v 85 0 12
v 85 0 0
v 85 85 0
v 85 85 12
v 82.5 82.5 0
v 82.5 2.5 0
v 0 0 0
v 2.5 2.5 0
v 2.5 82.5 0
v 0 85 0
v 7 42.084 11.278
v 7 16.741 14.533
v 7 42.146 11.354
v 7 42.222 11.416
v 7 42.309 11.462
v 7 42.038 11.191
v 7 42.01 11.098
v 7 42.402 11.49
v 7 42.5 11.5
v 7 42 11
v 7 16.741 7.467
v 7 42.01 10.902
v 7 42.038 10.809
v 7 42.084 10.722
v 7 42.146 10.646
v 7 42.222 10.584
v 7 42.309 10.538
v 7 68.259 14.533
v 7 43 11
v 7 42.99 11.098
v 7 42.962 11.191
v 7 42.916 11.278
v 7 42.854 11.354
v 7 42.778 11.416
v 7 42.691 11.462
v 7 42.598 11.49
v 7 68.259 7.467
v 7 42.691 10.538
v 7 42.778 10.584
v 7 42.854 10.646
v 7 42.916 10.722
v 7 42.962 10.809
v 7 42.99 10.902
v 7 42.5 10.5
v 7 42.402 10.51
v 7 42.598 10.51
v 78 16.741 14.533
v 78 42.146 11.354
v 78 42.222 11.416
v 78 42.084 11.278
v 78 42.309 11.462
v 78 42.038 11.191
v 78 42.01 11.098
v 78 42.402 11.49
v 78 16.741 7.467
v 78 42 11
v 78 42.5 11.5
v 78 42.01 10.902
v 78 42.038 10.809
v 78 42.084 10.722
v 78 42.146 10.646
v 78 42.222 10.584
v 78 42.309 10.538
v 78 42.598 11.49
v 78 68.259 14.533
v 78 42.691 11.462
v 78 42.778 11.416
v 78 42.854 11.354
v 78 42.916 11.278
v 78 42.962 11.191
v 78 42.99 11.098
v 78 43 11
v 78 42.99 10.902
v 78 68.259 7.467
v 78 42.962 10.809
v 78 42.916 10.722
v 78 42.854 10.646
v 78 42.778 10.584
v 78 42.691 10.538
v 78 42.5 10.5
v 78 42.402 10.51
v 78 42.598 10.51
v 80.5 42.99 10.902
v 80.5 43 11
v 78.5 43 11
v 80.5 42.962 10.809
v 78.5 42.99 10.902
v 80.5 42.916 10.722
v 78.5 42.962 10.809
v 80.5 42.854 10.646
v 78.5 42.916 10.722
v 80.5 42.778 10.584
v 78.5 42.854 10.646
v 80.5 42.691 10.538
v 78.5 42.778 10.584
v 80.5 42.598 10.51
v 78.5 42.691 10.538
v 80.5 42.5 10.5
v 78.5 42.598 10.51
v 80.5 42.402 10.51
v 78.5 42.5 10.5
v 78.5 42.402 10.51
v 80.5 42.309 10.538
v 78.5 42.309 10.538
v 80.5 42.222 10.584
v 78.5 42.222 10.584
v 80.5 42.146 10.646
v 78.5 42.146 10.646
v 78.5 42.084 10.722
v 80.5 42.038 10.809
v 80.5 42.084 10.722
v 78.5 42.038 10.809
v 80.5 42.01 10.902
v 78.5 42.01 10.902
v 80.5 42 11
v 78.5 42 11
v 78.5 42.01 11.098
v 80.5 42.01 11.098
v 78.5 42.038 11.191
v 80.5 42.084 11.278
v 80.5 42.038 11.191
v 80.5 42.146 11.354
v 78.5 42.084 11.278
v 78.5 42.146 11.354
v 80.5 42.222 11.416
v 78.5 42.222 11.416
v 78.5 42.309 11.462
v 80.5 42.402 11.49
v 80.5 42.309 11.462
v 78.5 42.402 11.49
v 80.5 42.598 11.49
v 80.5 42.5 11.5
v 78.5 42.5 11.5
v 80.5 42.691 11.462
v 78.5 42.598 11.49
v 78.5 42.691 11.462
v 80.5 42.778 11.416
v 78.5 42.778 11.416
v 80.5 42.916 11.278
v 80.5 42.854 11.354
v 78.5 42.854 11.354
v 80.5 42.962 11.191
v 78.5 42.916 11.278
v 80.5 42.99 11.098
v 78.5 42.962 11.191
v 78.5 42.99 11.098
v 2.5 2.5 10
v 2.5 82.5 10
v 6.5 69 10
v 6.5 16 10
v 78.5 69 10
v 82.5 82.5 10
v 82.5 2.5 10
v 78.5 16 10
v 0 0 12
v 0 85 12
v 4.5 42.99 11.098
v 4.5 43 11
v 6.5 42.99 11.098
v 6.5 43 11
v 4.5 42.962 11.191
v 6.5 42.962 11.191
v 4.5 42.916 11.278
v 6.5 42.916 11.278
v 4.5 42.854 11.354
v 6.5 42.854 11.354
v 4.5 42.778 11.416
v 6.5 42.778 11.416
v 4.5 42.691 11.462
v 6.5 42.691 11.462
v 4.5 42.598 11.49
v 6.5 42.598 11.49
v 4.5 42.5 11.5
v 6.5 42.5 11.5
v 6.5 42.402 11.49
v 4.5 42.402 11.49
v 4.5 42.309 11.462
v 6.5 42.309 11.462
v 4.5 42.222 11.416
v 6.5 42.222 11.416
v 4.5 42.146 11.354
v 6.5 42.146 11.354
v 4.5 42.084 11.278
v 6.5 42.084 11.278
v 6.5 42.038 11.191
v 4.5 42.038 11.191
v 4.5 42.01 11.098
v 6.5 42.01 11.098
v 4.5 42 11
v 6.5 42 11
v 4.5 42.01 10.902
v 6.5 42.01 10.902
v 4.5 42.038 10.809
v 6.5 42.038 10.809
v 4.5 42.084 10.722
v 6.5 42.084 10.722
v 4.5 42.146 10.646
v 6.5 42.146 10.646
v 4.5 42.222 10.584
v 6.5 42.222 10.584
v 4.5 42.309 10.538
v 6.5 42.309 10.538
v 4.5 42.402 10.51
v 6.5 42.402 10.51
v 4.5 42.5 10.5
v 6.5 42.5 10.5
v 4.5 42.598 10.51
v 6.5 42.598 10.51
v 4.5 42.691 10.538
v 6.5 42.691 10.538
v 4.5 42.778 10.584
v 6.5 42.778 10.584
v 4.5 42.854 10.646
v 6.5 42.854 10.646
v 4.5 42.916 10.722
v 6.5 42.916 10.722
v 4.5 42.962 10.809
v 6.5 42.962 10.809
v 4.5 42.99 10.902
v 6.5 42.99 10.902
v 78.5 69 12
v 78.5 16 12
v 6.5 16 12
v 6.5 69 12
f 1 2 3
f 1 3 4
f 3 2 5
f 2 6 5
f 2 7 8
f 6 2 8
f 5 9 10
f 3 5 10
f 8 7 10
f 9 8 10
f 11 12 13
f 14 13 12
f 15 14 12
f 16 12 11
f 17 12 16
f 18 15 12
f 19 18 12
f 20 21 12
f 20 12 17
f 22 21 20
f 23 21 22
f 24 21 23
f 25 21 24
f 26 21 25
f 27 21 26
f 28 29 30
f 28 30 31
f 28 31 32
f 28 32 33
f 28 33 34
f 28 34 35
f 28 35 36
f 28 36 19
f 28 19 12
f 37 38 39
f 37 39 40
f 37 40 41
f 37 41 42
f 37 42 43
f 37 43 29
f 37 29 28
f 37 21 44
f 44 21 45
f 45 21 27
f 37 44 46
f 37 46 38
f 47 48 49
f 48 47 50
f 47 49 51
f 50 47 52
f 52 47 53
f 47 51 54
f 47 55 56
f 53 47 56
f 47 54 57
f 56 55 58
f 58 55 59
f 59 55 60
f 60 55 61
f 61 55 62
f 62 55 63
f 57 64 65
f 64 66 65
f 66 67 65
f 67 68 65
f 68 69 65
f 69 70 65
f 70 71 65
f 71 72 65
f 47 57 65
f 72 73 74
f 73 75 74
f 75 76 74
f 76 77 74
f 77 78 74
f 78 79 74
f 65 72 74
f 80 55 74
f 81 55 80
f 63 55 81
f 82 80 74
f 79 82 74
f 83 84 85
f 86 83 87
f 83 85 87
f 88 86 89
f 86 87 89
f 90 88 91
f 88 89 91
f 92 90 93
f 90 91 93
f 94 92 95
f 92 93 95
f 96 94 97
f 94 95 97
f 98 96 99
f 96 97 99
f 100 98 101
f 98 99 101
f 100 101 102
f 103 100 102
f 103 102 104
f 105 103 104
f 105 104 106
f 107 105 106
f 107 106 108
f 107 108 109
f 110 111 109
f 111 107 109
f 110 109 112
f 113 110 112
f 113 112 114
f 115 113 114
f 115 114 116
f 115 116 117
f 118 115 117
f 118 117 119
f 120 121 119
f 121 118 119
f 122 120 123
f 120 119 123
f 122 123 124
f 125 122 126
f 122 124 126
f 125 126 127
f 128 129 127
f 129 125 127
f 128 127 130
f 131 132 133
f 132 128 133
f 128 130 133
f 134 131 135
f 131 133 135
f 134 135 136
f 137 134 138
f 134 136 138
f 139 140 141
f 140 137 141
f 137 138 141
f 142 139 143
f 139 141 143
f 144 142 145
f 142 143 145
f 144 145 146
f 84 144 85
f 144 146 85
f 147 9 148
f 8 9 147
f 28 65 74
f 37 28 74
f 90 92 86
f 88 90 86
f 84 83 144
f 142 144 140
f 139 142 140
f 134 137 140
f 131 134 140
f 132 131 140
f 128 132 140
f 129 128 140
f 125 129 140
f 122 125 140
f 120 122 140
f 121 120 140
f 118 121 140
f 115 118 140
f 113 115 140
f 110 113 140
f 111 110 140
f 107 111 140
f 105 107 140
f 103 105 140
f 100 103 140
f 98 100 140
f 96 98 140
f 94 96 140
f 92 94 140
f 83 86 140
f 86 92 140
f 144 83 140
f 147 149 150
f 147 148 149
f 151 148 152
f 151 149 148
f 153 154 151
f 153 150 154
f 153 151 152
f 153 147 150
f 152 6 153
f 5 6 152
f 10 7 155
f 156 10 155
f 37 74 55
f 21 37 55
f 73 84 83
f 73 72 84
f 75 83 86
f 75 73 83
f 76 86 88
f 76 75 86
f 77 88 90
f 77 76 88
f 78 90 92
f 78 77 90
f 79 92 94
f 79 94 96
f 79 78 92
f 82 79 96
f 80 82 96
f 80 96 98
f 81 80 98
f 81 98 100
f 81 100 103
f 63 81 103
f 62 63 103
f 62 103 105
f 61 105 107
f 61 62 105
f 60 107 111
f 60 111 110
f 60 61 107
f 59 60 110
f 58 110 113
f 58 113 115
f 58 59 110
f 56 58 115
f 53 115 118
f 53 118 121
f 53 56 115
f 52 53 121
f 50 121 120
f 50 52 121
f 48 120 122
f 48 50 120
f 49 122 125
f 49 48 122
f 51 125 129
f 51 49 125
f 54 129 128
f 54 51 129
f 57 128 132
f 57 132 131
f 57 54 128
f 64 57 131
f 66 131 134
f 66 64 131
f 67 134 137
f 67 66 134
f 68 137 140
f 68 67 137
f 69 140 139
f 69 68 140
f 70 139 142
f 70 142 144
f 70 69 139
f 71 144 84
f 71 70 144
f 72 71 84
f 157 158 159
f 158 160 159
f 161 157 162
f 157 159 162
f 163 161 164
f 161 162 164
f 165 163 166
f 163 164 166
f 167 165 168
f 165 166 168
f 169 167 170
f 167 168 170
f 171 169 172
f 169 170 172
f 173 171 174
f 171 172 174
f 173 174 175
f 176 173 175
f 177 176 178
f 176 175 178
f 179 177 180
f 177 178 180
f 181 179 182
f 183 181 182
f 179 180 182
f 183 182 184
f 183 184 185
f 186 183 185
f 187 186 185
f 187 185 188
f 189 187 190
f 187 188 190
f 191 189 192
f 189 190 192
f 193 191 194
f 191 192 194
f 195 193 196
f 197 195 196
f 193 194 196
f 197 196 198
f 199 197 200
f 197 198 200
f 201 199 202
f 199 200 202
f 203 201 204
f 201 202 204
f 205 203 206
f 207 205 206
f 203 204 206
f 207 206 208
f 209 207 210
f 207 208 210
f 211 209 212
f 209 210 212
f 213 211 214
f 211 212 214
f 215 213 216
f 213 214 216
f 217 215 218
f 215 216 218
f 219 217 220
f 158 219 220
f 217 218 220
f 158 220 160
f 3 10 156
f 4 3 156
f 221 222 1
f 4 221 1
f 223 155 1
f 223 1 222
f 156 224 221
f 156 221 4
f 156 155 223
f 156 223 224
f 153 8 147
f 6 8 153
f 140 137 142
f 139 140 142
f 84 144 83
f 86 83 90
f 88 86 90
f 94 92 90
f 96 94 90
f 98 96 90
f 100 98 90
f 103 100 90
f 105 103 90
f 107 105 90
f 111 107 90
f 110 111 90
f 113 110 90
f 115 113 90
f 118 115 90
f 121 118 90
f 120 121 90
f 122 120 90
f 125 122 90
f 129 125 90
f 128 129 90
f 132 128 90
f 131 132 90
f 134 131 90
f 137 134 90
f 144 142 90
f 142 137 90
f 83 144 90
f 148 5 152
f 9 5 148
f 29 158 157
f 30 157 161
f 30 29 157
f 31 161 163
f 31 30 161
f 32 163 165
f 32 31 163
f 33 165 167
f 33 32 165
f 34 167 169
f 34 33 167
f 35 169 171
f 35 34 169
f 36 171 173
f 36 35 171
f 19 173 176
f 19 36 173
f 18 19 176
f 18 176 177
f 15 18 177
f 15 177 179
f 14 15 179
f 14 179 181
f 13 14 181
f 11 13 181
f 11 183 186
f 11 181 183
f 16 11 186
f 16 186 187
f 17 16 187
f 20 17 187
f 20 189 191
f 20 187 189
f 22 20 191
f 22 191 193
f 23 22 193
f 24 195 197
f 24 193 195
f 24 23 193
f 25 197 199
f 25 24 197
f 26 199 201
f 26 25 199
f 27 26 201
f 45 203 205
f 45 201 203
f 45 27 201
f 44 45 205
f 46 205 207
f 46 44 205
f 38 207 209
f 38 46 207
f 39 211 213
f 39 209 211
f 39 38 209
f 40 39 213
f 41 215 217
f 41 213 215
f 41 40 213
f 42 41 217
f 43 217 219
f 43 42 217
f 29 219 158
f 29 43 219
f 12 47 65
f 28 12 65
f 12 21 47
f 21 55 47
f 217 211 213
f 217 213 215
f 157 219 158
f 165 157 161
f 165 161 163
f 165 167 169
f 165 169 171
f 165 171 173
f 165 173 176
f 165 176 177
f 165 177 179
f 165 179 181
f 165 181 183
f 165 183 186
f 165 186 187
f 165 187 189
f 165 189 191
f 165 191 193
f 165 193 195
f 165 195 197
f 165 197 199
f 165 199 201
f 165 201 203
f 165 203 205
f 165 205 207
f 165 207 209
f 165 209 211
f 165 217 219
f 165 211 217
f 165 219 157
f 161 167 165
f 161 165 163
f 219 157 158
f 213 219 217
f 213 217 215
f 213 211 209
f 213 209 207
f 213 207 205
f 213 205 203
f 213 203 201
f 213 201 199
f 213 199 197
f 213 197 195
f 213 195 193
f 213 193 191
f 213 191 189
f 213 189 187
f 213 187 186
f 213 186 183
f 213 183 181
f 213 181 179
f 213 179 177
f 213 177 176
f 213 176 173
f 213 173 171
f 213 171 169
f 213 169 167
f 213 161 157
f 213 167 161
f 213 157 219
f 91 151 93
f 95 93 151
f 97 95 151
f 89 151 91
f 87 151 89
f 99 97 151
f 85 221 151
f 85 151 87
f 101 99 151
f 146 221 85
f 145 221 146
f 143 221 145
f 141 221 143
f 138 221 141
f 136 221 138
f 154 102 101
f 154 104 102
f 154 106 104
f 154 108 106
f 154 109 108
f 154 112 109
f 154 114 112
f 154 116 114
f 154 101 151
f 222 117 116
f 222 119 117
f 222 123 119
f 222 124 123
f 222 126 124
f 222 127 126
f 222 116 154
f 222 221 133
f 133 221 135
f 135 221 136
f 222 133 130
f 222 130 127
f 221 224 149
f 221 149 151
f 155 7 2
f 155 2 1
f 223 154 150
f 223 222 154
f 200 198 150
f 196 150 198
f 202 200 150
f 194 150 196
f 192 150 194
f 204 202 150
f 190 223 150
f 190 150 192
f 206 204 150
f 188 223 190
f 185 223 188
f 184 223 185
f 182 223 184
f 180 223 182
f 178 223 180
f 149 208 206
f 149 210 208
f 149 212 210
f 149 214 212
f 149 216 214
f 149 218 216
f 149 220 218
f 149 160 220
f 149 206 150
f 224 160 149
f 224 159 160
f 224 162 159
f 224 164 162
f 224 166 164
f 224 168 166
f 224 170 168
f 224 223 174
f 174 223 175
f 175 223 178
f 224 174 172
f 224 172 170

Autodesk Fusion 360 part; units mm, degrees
box "BoxPrimitive3" add length 85 width 85 height 12 placed x (0, 1, 0) y (-1, 0, 0) z (0, 0, 1) at (85, 0, 0) makes body 1 in component "panel"
ref_plane "WorkPlane1" through (42.5, 42.5, 12) normal (0, 0, 1) x (0, 1, 0) in component "panel"
sketch "Sketch5" plane through (42.5, 42.5, 12) normal (0, 0, 1) x (1, 0, 0) in component "panel"
  line L0 (-36, 26.5) -> (36, 26.5)
  line L1 (36, 26.5) -> (36, -26.5)
  line L2 (36, -26.5) -> (-36, -26.5)
  line L3 (-36, -26.5) -> (-36, 26.5)
  dimension "d59" = 72
  dimension "d60" = 53
  dimension "d61" = 36
  dimension "d63" = 26.5
extrude "Extrude3" cut sketch "Sketch5" against normal through all bodies 1 in component "panel"
ref_plane "WorkPlane2" through (42.5, 42.5, 0) normal (0, 0, -1) x (0, -1, 0) in component "panel"
sketch "Sketch7" plane through (42.5, 42.5, 0) normal (0, 0, -1) x (1, 0, 0) in component "panel"
  line L0 (-40, 40) -> (40, 40)
  line L1 (40, 40) -> (40, -40)
  line L2 (40, -40) -> (-40, -40)
  line L3 (-40, -40) -> (-40, 40)
  line L4 (-42.5, 42.5) -> (-42.5, -42.5)
  line L5 (42.5, -42.5) -> (42.5, 42.5)
  line L6 (42.5, 42.5) -> (-42.5, 42.5)
  line L7 (-42.5, -42.5) -> (42.5, -42.5)
  dimension "d110" = 2.5
  dimension "d112" = 2.5
  dimension "d113" = 2.5
  dimension "d114" = 2.5
extrude "Extrude4" cut sketch "Sketch7" against normal blind 10 contours L0 L1 L2 L3 bodies 1 in component "panel"
ref_plane "WorkPlane1" through (42.5, 42.5, 11) normal (-1, 0, 0) x (0, 1, 0) in component "Button"
sketch "Sketch3" plane through (42.5, 42.5, 11) normal (-1, 0, 0) x (0, 1, 0) in component "Button"
  line L0 (-25.7589, 3.5328) -> (-25.7589, -3.5328)
  line L1 (-25.7589, -3.5328) -> (25.7589, -3.5328)
  line L2 (25.7589, -3.5328) -> (25.7589, 3.5328)
  line L3 (25.7589, 3.5328) -> (-25.7589, 3.5328)
  line L4 (-25.7589, 3.5328) -> (25.7589, -3.5328) construction
  line L5 (-25.7589, -3.5328) -> (25.7589, 3.5328) construction
  line L6 (-25.7589, -3.5328) -> (-24.8077, 3.4023) construction
  line L7 (25.7589, -3.5328) -> (24.8077, 3.4023) construction
  line L8 (0, 0) -> (0, -3.5328) construction
  dimension "d96" = 7
  dimension "d97" = 52
extrude "Extrude1" add sketch "Sketch3" along normal mid plane 71 separate body makes body 2 in component "Button"
ref_plane "WorkPlane4" through (42.5, 42.5, 11) normal (1, 0, 0) x (0, -1, 0) in component "panel"
sketch "Sketch9" plane through (42.5, 42.5, 11) normal (1, 0, 0) x (0, 1, 0) in component "panel"
  circle A0 centre (0, 0) radius 0.5
  dimension "d100" = 1
extrude "Extrude6" cut sketch "Sketch9" along normal mid plane 76 bodies 1 in component "panel"
sketch "Sketch4" plane through (42.5, 42.5, 11) normal (-1, 0, 0) x (0, 1, 0) in component "Button"
  circle A0 centre (0, 0) radius 0.5
  dimension "d103" = 1
extrude "Extrude2" add sketch "Sketch4" along normal mid plane 76 bodies 2 in component "Button"
component "panel" placed x (1, 0, 0) y (0, 1, 0) z (0, 0, 1) at (0, 0, 0)
component "Button" placed x (1, 0, 0) y (0, 1, 0) z (0, 0, 1) at (0, 0, 0)
